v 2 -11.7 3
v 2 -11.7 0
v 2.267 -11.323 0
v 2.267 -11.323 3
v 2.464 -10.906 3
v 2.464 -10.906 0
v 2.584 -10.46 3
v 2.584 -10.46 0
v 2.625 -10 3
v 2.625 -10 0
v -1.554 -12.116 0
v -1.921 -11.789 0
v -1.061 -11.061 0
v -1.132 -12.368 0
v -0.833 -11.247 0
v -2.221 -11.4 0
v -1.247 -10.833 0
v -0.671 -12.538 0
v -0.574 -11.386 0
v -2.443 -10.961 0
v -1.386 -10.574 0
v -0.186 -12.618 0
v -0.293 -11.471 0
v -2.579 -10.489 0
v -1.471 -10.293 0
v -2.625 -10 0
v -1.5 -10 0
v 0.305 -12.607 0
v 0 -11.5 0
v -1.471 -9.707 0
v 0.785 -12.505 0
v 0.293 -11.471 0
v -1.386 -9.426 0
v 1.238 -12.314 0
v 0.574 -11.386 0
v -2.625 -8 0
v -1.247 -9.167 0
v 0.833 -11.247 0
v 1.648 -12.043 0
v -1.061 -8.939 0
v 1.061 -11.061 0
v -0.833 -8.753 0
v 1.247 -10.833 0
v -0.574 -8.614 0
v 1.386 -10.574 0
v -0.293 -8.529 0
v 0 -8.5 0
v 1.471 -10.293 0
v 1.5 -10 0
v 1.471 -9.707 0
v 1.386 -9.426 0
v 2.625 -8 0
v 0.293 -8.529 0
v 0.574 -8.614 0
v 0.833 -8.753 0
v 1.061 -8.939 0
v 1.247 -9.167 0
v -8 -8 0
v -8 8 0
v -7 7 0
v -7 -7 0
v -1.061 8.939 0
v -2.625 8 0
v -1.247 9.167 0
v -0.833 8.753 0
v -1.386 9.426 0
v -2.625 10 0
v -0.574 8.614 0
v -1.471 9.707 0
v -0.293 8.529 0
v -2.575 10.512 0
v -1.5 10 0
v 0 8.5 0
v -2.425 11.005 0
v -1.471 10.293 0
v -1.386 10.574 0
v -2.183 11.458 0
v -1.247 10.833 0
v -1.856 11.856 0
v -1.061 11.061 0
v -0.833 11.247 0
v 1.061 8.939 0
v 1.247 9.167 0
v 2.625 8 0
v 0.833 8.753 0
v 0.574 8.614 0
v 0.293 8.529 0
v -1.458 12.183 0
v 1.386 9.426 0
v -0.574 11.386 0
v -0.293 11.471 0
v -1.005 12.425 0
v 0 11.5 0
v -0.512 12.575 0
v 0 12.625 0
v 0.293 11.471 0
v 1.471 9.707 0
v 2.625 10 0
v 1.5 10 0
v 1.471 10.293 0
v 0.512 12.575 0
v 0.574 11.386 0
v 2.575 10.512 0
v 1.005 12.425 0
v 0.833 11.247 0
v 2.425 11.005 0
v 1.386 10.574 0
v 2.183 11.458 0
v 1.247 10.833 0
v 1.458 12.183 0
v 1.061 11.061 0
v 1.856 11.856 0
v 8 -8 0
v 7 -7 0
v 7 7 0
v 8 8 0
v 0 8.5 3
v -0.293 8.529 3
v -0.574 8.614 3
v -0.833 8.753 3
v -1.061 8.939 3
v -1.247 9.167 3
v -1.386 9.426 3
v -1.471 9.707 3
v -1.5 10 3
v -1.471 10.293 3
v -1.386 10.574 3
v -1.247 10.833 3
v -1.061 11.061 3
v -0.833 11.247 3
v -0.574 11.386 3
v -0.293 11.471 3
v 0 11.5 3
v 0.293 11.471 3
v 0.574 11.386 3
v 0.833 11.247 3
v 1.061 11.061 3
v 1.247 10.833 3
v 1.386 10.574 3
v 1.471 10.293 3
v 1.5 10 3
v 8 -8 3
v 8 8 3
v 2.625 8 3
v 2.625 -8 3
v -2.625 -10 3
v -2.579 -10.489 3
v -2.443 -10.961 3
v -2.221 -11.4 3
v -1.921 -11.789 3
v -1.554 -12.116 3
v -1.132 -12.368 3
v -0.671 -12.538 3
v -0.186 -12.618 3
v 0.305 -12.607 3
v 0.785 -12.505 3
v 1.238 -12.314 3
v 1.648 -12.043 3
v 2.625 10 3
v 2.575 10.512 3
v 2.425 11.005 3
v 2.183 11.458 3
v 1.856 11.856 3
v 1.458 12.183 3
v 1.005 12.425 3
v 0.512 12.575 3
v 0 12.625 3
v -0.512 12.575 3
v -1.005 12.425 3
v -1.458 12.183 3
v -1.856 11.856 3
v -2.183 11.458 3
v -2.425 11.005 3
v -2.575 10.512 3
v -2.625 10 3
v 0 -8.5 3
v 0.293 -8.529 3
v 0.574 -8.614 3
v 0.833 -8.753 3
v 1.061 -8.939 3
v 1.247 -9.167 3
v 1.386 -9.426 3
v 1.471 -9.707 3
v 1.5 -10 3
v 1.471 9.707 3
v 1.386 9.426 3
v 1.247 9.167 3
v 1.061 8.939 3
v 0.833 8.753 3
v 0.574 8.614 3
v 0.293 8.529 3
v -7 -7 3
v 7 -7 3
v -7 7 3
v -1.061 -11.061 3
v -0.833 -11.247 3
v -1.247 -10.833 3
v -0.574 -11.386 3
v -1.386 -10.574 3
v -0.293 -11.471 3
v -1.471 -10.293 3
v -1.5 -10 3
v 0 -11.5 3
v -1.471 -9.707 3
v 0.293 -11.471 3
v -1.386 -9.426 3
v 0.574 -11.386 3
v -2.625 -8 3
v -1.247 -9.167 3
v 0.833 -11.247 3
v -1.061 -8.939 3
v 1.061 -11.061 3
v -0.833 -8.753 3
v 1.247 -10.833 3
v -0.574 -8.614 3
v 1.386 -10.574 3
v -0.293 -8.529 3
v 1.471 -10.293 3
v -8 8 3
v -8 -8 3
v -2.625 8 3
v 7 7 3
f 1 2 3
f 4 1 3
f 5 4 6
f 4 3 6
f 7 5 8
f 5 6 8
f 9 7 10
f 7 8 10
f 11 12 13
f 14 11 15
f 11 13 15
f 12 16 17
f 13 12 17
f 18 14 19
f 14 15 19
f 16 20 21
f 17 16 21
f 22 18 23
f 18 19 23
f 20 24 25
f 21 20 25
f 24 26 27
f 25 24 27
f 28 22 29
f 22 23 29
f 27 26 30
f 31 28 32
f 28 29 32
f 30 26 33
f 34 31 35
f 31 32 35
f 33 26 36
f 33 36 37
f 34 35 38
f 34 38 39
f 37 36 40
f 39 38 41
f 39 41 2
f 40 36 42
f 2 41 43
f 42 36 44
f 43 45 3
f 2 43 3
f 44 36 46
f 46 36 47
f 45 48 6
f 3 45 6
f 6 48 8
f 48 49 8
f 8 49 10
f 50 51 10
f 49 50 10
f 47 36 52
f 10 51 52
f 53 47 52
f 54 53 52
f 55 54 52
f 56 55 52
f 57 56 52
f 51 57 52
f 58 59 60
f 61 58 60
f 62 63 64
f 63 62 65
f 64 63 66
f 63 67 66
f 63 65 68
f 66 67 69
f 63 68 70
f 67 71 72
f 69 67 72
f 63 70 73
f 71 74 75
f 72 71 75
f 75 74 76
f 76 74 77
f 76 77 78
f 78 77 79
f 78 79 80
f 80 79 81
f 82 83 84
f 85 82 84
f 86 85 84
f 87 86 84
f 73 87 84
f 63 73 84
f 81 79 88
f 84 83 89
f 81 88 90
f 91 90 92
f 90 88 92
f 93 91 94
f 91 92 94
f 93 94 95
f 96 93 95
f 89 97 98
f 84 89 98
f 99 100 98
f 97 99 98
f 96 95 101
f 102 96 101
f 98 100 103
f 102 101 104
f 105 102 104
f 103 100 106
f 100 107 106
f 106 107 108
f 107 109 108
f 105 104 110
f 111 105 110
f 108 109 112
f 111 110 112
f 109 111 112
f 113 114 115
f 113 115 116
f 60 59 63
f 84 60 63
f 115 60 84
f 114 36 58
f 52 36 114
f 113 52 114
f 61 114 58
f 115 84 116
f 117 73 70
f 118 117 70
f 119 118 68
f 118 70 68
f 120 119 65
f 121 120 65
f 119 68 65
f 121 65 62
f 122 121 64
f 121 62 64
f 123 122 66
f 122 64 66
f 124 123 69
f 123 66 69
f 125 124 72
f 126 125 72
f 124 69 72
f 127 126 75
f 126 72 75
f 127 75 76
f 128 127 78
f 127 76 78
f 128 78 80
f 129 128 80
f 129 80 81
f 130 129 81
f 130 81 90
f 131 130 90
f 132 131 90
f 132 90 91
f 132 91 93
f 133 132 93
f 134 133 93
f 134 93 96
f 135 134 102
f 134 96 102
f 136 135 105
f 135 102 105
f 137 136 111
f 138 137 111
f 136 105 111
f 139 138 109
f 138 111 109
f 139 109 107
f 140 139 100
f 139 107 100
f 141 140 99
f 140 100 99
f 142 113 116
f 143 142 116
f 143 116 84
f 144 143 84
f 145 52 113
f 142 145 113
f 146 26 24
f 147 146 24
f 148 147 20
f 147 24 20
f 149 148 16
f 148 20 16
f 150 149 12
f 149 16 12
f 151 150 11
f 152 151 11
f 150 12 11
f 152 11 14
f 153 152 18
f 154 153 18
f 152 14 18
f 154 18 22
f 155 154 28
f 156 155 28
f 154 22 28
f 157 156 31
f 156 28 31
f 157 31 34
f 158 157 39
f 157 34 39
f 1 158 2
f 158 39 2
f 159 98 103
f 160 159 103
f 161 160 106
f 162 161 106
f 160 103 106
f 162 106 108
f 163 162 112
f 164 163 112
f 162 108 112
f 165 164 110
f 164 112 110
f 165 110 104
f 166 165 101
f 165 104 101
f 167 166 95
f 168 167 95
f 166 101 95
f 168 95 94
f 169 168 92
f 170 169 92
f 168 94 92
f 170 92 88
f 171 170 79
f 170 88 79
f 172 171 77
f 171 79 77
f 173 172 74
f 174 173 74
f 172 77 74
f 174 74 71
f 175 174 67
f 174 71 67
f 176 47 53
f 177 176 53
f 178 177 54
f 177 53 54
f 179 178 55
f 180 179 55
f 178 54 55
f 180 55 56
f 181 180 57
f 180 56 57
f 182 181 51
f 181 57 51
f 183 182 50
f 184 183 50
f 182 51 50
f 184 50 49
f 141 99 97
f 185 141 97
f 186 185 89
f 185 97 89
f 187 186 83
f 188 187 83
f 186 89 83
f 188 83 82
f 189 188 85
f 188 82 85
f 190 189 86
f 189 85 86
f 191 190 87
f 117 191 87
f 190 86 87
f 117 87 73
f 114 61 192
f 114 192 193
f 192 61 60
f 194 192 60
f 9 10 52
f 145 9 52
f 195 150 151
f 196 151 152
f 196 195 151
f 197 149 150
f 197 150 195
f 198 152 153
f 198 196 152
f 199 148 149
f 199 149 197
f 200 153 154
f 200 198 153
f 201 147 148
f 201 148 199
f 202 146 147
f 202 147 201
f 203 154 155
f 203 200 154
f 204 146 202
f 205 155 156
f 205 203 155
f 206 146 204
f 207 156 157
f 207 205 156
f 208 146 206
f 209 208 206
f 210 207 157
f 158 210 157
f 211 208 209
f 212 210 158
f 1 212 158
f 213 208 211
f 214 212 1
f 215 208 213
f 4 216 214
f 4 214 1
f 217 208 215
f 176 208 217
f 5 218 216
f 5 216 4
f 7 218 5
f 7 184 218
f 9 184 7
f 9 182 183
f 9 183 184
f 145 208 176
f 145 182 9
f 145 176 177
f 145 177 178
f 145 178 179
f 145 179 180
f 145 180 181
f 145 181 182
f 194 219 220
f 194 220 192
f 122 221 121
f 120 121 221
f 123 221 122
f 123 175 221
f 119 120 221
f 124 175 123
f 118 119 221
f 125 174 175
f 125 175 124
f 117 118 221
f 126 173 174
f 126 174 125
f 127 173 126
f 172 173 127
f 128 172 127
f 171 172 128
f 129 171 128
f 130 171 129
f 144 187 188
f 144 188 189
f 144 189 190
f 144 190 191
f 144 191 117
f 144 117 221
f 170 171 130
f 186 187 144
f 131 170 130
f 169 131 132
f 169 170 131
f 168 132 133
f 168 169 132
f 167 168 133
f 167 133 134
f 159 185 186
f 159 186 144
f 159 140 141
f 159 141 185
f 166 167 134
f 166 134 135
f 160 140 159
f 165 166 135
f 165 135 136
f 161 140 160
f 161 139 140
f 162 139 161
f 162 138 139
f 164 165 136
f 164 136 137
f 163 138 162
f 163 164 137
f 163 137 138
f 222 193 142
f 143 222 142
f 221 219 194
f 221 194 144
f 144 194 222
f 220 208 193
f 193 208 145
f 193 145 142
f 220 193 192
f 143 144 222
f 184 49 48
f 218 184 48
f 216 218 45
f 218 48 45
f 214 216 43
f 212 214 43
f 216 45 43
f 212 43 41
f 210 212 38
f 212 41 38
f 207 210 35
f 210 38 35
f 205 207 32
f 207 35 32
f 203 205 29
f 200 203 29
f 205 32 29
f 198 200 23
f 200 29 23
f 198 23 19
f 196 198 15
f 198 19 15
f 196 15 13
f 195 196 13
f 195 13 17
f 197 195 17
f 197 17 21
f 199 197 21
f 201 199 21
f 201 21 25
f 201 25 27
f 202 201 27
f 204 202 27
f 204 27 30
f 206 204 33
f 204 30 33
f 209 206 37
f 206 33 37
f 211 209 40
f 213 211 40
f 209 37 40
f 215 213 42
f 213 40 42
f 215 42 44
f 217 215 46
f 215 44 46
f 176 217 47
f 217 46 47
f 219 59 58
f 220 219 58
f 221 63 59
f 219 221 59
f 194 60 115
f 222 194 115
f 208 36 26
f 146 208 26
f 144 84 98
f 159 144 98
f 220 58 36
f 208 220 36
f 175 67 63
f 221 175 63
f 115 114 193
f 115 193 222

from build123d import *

# Parameters (mm, degrees)
F0_W     = 14
F0_H     = 14
F1_DEPTH = 3


# Not quite as in the source:
# - a feature names something its author has since deleted; it is built from what else it names


with BuildPart() as f1:
    # F0 (on Top) → F1 (new body)
    with BuildSketch(Plane.XY):
        with BuildLine():
            Line((2.625, -8), (8, -8))
            Line((8, -8), (8, 8))
            Line((8, 8), (2.625, 8))
            Line((2.625, 8), (2, 8))
            Line((2, 8), (1.7001838136, 8))
            ThreePointArc((1.7001838136, 8), (0, 7.375), (-1.7001838136, 8))
            Line((-1.7001838136, 8), (-2, 8))
            Line((-2, 8), (-2.625, 8))
            Line((-2.625, 8), (-8, 8))
            Line((-8, 8), (-8, -8))
            Line((-8, -8), (-2.625, -8))
            Line((-2.625, -8), (-2, -8))
            Line((-2, -8), (-1.7001838136, -8))
            ThreePointArc((-1.7001838136, -8), (0, -7.375), (1.7001838136, -8))
            Line((1.7001838136, -8), (2, -8))
            Line((2, -8), (2.625, -8))
        make_face()
        Rectangle(F0_W, F0_H, mode=Mode.SUBTRACT)
        with BuildLine():
            Line((2.625, -10), (2.625, -8))
            Line((2.625, -8), (2, -8))
            Line((2, -8), (2, -8.2998161864))
            ThreePointArc((2, -8.2998161864), (2.4638004181, -9.0942889534), (2.625, -10))
        make_face()
        with BuildLine():
            Line((2, -8.2998161864), (2, -8))
            Line((2, -8), (1.7001838136, -8))
            ThreePointArc((1.7001838136, -8), (1.8561553006, -8.1438446994), (2, -8.2998161864))
        make_face()
        with BuildLine():
            ThreePointArc((2, -11.7001838136), (2.4638004181, -10.9057110466), (2.625, -10))
            ThreePointArc((2.625, -10), (2.4638004181, -9.0942889534), (2, -8.2998161864))
            Line((2, -8.2998161864), (2, -11.7001838136))
        make_face()
        with BuildLine():
            Line((2, 8), (2.625, 8))
            Line((2.625, 8), (2.625, 10))
            ThreePointArc((2.625, 10), (2.382604406, 8.8982644398), (1.7001838136, 8))
            Line((1.7001838136, 8), (2, 8))
        make_face()
        with BuildLine():
            ThreePointArc((2, -8.2998161864), (1.8561553006, -8.1438446994), (1.7001838136, -8))
            Line((1.7001838136, -8), (0, -8))
            Line((0, -8), (-1.7001838136, -8))
            ThreePointArc((-1.7001838136, -8), (-2.382604406, -8.8982644398), (-2.625, -10))
            ThreePointArc((-2.625, -10), (-0.9057110466, -12.4638004181), (2, -11.7001838136))
            Line((2, -11.7001838136), (2, -8.2998161864))
        make_face()
        with BuildLine():
            ThreePointArc((1.5, -10), (-1.0606601718, -11.0606601718), (0, -8.5))
            ThreePointArc((0, -8.5), (1.0606601718, -8.9393398282), (1.5, -10))
        make_face(mode=Mode.SUBTRACT)
        with BuildLine():
            Line((0, -8), (1.7001838136, -8))
            ThreePointArc((1.7001838136, -8), (0, -7.375), (-1.7001838136, -8))
            Line((-1.7001838136, -8), (0, -8))
        make_face()
        with BuildLine():
            ThreePointArc((1.7001838136, 8), (2.382604406, 8.8982644398), (2.625, 10))
            ThreePointArc((2.625, 10), (0, 12.625), (-2.625, 10))
            ThreePointArc((-2.625, 10), (-2.382604406, 8.8982644398), (-1.7001838136, 8))
            Line((-1.7001838136, 8), (0, 8))
            Line((0, 8), (1.7001838136, 8))
        make_face()
        with BuildLine():
            ThreePointArc((1.5, 10), (1.0606601718, 8.9393398282), (0, 8.5))
            ThreePointArc((0, 8.5), (-1.0606601718, 11.0606601718), (1.5, 10))
        make_face(mode=Mode.SUBTRACT)
        with BuildLine():
            ThreePointArc((-2.625, -10), (-2.382604406, -8.8982644398), (-1.7001838136, -8))
            Line((-1.7001838136, -8), (-2, -8))
            Line((-2, -8), (-2.625, -8))
            Line((-2.625, -8), (-2.625, -10))
        make_face()
        with BuildLine():
            ThreePointArc((-1.7001838136, 8), (0, 7.375), (1.7001838136, 8))
            Line((1.7001838136, 8), (0, 8))
            Line((0, 8), (-1.7001838136, 8))
        make_face()
        with BuildLine():
            ThreePointArc((-1.7001838136, 8), (-2.382604406, 8.8982644398), (-2.625, 10))
            Line((-2.625, 10), (-2.625, 8))
            Line((-2.625, 8), (-2, 8))
            Line((-2, 8), (-1.7001838136, 8))
        make_face()
    extrude(amount=F1_DEPTH)


solid = f1.part
